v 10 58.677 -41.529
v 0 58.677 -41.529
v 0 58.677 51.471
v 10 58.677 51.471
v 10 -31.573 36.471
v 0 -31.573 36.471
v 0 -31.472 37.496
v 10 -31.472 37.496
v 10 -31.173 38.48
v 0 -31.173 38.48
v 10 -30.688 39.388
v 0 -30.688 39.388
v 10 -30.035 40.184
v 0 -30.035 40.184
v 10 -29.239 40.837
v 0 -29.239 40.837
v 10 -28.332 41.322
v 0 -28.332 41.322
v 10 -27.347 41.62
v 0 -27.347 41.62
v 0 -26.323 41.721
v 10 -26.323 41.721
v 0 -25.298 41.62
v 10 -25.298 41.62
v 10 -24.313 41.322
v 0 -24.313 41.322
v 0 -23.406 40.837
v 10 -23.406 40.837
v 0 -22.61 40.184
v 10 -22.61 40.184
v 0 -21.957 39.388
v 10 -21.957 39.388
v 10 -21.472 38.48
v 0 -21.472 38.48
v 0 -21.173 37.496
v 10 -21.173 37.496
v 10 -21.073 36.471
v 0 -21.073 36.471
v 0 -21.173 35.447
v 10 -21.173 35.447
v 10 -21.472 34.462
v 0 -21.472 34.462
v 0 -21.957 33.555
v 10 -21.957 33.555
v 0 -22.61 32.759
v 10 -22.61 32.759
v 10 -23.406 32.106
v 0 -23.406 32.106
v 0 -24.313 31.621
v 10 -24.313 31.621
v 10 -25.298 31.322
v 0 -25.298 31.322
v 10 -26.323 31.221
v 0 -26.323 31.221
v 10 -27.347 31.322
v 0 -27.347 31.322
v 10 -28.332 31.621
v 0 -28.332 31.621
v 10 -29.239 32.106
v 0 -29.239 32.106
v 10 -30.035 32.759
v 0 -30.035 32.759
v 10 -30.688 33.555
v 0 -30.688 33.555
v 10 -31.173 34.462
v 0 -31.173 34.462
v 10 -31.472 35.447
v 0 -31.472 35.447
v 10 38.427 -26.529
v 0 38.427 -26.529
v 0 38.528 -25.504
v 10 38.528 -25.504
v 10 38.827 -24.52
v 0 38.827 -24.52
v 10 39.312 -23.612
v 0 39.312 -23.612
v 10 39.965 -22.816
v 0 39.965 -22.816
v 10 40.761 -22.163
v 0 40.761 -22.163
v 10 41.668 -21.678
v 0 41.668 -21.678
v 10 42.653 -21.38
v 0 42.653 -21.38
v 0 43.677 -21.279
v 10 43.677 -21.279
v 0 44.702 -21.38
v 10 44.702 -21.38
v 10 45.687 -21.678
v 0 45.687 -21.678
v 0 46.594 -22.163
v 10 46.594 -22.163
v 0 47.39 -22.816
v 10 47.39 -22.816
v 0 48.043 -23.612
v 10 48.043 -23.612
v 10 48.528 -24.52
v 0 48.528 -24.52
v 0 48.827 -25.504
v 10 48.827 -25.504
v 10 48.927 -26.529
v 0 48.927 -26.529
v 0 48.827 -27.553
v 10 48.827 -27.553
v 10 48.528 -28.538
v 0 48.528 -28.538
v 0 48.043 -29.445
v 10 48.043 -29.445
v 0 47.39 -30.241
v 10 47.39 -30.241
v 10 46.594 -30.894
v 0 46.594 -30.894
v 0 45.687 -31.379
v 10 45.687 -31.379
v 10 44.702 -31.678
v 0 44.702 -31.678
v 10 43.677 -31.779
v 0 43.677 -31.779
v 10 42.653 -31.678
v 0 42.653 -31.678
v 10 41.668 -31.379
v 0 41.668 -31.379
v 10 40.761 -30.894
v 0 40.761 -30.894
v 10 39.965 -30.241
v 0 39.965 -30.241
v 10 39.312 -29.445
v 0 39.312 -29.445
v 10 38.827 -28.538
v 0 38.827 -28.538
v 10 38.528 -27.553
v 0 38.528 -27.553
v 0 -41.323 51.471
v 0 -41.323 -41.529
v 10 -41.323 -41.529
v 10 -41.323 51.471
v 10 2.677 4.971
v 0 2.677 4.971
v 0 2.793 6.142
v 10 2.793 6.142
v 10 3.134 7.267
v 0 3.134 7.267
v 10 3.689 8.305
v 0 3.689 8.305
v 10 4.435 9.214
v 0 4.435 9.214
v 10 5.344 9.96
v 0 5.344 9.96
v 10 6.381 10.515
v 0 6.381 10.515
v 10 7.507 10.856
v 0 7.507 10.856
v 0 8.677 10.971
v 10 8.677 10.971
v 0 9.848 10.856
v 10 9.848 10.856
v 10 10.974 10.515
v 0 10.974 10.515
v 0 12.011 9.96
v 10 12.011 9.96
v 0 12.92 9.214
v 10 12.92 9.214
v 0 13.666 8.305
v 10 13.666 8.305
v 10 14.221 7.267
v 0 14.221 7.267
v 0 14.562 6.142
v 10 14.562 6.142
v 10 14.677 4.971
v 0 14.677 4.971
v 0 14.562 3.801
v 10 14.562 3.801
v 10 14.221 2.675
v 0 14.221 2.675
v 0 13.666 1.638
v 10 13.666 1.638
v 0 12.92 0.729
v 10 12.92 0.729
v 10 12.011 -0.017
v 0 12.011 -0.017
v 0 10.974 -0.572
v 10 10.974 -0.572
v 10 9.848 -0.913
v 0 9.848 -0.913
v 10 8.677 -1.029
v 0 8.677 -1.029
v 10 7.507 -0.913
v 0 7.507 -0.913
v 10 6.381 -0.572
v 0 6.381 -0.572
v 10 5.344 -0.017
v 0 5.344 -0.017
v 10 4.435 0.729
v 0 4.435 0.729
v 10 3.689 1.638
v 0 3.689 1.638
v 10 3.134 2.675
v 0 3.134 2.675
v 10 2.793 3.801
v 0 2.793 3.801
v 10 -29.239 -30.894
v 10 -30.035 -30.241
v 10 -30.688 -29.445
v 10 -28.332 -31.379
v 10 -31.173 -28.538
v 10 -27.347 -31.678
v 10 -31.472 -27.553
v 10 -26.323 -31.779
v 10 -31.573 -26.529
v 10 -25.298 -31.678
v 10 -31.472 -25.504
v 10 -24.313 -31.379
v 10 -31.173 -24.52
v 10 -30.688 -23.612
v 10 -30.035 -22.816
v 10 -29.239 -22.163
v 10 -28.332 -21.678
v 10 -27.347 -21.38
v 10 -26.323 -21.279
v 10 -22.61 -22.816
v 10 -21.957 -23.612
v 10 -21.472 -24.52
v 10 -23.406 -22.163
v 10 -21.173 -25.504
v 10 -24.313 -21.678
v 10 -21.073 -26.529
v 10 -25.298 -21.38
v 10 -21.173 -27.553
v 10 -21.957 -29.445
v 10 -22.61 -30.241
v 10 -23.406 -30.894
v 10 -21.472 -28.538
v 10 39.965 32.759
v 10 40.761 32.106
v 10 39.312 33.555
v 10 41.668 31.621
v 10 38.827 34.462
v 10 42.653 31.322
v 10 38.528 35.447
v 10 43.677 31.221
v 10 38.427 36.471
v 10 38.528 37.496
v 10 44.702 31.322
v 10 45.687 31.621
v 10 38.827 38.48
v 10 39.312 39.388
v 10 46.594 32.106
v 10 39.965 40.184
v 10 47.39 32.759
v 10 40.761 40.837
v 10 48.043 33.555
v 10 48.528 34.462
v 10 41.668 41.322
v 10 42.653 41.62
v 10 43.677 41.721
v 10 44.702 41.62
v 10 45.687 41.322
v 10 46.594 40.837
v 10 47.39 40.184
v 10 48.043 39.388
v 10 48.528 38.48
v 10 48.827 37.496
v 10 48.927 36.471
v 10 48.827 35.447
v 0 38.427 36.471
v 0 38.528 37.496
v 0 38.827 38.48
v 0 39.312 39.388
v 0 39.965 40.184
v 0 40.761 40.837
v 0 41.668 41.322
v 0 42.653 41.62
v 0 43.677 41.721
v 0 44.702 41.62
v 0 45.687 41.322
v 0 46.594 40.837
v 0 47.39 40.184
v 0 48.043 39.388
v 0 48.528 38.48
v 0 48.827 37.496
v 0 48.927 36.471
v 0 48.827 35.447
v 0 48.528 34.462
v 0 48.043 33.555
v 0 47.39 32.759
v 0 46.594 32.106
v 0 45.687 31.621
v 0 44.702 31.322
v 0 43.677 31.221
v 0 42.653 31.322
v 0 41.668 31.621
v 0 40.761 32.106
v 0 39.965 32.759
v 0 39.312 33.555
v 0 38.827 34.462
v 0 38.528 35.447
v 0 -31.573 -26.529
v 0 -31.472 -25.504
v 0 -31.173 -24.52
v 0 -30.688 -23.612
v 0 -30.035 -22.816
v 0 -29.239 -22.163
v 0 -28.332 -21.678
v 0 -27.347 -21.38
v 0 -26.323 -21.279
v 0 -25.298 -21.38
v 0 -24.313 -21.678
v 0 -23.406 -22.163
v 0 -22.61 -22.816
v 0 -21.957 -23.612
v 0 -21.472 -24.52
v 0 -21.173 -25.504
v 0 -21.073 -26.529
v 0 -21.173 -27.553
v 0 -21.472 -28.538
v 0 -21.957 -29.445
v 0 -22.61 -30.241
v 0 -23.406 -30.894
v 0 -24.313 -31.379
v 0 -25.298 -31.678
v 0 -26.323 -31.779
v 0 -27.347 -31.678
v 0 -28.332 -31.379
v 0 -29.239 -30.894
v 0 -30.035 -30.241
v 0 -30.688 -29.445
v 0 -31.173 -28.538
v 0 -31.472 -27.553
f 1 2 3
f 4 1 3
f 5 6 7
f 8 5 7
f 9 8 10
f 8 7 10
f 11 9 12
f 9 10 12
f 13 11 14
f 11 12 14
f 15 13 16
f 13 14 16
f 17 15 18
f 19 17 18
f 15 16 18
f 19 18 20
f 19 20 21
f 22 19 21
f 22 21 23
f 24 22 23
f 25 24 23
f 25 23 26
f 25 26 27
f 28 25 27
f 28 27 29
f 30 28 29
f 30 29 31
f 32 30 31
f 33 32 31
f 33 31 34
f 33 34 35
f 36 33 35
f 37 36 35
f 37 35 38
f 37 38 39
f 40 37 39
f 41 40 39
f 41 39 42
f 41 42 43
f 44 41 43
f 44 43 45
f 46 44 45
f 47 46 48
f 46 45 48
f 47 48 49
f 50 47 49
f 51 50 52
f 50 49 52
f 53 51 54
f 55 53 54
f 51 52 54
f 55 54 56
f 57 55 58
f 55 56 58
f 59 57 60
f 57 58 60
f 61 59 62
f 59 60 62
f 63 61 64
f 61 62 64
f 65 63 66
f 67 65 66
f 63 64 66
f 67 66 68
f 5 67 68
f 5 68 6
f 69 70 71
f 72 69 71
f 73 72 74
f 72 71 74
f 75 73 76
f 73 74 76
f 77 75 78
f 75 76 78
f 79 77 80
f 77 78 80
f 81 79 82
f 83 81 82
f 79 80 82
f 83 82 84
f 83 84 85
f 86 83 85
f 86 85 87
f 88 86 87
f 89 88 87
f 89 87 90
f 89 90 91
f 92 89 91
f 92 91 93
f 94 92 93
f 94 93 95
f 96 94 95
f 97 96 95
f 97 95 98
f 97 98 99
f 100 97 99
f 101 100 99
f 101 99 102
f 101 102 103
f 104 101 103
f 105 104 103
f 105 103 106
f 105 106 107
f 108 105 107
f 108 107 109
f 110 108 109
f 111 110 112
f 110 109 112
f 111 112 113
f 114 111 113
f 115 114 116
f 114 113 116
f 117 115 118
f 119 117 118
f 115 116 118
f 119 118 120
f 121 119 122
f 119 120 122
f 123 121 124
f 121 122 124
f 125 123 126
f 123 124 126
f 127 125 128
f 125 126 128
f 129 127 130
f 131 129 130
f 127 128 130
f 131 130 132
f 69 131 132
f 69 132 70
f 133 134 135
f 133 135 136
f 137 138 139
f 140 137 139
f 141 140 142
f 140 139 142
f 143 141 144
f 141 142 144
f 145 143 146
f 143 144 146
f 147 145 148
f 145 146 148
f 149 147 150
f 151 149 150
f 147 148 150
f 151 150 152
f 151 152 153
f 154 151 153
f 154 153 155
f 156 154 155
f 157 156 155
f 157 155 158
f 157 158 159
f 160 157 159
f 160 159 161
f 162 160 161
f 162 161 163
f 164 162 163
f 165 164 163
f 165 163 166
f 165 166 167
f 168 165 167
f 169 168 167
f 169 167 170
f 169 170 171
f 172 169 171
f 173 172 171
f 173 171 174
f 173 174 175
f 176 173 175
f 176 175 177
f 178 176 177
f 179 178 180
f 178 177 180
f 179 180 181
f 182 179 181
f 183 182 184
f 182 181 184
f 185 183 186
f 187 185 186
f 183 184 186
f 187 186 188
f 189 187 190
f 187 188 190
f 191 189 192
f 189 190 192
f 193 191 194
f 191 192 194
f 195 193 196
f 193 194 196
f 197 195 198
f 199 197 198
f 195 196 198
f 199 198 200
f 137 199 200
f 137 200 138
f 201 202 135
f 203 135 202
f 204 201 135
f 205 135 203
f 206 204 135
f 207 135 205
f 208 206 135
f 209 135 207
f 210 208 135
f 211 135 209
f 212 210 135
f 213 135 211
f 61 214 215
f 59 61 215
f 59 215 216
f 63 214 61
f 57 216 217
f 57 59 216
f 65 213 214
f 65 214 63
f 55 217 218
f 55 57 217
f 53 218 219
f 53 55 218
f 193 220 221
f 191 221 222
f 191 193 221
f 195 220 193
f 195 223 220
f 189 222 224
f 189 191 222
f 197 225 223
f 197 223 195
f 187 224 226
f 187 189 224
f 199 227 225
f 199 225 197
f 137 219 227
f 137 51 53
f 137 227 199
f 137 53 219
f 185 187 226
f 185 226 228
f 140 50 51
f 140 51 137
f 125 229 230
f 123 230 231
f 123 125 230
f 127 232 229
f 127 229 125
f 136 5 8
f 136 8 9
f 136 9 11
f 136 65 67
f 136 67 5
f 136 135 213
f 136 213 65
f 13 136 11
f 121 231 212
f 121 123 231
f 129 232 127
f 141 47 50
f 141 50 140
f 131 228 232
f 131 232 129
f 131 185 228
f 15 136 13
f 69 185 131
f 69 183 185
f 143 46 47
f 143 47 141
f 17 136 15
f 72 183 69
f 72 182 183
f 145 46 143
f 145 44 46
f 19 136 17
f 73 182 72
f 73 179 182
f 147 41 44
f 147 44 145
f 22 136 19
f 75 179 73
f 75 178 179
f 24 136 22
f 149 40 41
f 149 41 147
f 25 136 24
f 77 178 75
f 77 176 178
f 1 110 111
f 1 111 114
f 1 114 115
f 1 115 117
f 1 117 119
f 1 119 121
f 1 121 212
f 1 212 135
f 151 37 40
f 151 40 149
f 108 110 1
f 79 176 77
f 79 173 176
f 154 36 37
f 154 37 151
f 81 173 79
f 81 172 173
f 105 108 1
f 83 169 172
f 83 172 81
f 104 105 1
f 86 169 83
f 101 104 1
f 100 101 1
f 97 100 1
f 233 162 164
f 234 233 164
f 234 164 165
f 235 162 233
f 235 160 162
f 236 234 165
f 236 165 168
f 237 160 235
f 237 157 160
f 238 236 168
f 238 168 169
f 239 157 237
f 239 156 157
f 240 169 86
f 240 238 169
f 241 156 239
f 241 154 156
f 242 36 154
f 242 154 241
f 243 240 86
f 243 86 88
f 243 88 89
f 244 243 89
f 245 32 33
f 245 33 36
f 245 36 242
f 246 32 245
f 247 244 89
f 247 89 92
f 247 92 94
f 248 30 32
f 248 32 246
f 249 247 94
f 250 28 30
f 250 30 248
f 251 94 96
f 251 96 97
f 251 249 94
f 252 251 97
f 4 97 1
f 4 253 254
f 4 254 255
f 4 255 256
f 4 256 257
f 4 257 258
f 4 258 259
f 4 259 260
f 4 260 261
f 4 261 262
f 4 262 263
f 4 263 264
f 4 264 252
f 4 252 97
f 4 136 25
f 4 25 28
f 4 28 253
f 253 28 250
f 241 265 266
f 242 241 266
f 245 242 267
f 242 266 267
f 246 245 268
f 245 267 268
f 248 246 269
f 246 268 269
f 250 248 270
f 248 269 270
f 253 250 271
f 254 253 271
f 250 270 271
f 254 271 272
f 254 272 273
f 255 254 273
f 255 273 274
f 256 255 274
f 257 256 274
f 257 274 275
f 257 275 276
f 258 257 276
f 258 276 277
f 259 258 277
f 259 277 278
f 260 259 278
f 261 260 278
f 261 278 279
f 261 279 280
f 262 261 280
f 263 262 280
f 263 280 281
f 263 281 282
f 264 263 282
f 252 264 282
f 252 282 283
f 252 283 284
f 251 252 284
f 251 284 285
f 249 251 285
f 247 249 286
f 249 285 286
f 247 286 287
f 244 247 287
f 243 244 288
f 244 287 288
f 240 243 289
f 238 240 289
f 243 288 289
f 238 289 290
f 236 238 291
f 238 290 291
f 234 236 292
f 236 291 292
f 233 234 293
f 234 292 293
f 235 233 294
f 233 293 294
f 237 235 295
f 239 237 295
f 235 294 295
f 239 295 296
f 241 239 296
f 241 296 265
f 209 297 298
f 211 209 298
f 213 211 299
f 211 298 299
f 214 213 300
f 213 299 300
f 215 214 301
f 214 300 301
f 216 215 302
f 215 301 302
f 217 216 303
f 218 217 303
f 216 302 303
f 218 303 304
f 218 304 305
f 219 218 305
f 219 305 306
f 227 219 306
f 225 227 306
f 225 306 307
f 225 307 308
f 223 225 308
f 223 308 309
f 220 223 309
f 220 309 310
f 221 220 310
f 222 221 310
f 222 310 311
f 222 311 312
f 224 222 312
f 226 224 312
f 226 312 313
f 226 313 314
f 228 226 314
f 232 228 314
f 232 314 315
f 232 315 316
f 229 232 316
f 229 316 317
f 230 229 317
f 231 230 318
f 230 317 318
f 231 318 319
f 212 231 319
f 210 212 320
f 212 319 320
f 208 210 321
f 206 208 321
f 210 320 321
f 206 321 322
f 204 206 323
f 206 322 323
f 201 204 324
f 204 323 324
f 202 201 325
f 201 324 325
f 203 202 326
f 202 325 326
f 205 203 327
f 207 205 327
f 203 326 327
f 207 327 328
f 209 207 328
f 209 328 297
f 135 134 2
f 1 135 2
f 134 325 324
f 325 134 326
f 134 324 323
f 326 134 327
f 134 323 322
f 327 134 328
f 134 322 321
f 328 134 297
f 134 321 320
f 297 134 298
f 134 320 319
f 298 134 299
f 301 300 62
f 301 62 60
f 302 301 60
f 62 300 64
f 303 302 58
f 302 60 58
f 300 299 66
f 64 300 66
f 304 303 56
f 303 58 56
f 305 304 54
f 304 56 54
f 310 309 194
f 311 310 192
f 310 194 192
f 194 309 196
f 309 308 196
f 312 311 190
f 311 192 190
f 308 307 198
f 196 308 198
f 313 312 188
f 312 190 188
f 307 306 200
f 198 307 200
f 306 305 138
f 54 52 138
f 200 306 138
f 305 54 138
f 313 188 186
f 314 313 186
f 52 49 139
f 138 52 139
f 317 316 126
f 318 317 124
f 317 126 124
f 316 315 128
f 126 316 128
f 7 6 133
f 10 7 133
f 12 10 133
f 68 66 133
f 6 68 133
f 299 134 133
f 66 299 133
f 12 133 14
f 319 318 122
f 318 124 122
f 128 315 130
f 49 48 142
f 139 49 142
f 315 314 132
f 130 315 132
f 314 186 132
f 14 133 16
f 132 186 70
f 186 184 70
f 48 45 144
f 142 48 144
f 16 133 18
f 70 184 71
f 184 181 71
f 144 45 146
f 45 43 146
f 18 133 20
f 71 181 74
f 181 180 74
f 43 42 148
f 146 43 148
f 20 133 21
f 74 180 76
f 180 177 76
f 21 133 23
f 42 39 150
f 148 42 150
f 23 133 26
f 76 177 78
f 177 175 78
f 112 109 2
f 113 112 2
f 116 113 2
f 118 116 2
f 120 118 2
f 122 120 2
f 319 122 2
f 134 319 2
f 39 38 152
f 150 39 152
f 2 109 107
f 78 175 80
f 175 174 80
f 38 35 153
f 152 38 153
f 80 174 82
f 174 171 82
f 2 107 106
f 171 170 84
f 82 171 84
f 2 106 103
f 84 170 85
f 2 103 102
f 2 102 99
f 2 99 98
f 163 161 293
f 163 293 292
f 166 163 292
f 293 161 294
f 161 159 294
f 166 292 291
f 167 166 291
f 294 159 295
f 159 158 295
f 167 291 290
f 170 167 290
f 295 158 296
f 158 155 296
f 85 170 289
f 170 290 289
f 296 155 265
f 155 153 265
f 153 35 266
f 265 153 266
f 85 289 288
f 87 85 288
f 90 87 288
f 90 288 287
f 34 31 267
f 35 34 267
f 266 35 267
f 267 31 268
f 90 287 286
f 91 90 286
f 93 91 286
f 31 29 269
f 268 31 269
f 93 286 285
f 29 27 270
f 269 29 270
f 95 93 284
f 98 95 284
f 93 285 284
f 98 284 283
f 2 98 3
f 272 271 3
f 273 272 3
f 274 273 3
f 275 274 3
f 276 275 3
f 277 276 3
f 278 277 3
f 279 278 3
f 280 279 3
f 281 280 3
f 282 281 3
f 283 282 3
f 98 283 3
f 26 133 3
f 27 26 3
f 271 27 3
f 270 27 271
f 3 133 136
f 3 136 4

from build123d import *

# Parameters (mm, degrees)
F0_W     = 100
F0_H     = 93
F1_DEPTH = 10
F3_D     = 10.5
F4_D     = 12


with BuildPart() as f1:
    # F0 (on Right) → F1 (new body)
    with BuildSketch(Plane.YZ):
        with Locations((8.67743, 4.971333)):
            Rectangle(F0_W, F0_H)
    extrude(amount=F1_DEPTH)

    # F3 (through all)
    with Locations(Plane.YZ.offset(10)):
        with Locations((-26.32257, 36.471333), (43.67743, 36.471333), (-26.32257, -26.528667), (43.67743, -26.528667)):
            Hole(F3_D / 2)

    # F4 (through all)
    with Locations(Plane.YZ.offset(10)):
        with Locations((8.67743, 4.971333)):
            Hole(F4_D / 2)


solid = f1.part
